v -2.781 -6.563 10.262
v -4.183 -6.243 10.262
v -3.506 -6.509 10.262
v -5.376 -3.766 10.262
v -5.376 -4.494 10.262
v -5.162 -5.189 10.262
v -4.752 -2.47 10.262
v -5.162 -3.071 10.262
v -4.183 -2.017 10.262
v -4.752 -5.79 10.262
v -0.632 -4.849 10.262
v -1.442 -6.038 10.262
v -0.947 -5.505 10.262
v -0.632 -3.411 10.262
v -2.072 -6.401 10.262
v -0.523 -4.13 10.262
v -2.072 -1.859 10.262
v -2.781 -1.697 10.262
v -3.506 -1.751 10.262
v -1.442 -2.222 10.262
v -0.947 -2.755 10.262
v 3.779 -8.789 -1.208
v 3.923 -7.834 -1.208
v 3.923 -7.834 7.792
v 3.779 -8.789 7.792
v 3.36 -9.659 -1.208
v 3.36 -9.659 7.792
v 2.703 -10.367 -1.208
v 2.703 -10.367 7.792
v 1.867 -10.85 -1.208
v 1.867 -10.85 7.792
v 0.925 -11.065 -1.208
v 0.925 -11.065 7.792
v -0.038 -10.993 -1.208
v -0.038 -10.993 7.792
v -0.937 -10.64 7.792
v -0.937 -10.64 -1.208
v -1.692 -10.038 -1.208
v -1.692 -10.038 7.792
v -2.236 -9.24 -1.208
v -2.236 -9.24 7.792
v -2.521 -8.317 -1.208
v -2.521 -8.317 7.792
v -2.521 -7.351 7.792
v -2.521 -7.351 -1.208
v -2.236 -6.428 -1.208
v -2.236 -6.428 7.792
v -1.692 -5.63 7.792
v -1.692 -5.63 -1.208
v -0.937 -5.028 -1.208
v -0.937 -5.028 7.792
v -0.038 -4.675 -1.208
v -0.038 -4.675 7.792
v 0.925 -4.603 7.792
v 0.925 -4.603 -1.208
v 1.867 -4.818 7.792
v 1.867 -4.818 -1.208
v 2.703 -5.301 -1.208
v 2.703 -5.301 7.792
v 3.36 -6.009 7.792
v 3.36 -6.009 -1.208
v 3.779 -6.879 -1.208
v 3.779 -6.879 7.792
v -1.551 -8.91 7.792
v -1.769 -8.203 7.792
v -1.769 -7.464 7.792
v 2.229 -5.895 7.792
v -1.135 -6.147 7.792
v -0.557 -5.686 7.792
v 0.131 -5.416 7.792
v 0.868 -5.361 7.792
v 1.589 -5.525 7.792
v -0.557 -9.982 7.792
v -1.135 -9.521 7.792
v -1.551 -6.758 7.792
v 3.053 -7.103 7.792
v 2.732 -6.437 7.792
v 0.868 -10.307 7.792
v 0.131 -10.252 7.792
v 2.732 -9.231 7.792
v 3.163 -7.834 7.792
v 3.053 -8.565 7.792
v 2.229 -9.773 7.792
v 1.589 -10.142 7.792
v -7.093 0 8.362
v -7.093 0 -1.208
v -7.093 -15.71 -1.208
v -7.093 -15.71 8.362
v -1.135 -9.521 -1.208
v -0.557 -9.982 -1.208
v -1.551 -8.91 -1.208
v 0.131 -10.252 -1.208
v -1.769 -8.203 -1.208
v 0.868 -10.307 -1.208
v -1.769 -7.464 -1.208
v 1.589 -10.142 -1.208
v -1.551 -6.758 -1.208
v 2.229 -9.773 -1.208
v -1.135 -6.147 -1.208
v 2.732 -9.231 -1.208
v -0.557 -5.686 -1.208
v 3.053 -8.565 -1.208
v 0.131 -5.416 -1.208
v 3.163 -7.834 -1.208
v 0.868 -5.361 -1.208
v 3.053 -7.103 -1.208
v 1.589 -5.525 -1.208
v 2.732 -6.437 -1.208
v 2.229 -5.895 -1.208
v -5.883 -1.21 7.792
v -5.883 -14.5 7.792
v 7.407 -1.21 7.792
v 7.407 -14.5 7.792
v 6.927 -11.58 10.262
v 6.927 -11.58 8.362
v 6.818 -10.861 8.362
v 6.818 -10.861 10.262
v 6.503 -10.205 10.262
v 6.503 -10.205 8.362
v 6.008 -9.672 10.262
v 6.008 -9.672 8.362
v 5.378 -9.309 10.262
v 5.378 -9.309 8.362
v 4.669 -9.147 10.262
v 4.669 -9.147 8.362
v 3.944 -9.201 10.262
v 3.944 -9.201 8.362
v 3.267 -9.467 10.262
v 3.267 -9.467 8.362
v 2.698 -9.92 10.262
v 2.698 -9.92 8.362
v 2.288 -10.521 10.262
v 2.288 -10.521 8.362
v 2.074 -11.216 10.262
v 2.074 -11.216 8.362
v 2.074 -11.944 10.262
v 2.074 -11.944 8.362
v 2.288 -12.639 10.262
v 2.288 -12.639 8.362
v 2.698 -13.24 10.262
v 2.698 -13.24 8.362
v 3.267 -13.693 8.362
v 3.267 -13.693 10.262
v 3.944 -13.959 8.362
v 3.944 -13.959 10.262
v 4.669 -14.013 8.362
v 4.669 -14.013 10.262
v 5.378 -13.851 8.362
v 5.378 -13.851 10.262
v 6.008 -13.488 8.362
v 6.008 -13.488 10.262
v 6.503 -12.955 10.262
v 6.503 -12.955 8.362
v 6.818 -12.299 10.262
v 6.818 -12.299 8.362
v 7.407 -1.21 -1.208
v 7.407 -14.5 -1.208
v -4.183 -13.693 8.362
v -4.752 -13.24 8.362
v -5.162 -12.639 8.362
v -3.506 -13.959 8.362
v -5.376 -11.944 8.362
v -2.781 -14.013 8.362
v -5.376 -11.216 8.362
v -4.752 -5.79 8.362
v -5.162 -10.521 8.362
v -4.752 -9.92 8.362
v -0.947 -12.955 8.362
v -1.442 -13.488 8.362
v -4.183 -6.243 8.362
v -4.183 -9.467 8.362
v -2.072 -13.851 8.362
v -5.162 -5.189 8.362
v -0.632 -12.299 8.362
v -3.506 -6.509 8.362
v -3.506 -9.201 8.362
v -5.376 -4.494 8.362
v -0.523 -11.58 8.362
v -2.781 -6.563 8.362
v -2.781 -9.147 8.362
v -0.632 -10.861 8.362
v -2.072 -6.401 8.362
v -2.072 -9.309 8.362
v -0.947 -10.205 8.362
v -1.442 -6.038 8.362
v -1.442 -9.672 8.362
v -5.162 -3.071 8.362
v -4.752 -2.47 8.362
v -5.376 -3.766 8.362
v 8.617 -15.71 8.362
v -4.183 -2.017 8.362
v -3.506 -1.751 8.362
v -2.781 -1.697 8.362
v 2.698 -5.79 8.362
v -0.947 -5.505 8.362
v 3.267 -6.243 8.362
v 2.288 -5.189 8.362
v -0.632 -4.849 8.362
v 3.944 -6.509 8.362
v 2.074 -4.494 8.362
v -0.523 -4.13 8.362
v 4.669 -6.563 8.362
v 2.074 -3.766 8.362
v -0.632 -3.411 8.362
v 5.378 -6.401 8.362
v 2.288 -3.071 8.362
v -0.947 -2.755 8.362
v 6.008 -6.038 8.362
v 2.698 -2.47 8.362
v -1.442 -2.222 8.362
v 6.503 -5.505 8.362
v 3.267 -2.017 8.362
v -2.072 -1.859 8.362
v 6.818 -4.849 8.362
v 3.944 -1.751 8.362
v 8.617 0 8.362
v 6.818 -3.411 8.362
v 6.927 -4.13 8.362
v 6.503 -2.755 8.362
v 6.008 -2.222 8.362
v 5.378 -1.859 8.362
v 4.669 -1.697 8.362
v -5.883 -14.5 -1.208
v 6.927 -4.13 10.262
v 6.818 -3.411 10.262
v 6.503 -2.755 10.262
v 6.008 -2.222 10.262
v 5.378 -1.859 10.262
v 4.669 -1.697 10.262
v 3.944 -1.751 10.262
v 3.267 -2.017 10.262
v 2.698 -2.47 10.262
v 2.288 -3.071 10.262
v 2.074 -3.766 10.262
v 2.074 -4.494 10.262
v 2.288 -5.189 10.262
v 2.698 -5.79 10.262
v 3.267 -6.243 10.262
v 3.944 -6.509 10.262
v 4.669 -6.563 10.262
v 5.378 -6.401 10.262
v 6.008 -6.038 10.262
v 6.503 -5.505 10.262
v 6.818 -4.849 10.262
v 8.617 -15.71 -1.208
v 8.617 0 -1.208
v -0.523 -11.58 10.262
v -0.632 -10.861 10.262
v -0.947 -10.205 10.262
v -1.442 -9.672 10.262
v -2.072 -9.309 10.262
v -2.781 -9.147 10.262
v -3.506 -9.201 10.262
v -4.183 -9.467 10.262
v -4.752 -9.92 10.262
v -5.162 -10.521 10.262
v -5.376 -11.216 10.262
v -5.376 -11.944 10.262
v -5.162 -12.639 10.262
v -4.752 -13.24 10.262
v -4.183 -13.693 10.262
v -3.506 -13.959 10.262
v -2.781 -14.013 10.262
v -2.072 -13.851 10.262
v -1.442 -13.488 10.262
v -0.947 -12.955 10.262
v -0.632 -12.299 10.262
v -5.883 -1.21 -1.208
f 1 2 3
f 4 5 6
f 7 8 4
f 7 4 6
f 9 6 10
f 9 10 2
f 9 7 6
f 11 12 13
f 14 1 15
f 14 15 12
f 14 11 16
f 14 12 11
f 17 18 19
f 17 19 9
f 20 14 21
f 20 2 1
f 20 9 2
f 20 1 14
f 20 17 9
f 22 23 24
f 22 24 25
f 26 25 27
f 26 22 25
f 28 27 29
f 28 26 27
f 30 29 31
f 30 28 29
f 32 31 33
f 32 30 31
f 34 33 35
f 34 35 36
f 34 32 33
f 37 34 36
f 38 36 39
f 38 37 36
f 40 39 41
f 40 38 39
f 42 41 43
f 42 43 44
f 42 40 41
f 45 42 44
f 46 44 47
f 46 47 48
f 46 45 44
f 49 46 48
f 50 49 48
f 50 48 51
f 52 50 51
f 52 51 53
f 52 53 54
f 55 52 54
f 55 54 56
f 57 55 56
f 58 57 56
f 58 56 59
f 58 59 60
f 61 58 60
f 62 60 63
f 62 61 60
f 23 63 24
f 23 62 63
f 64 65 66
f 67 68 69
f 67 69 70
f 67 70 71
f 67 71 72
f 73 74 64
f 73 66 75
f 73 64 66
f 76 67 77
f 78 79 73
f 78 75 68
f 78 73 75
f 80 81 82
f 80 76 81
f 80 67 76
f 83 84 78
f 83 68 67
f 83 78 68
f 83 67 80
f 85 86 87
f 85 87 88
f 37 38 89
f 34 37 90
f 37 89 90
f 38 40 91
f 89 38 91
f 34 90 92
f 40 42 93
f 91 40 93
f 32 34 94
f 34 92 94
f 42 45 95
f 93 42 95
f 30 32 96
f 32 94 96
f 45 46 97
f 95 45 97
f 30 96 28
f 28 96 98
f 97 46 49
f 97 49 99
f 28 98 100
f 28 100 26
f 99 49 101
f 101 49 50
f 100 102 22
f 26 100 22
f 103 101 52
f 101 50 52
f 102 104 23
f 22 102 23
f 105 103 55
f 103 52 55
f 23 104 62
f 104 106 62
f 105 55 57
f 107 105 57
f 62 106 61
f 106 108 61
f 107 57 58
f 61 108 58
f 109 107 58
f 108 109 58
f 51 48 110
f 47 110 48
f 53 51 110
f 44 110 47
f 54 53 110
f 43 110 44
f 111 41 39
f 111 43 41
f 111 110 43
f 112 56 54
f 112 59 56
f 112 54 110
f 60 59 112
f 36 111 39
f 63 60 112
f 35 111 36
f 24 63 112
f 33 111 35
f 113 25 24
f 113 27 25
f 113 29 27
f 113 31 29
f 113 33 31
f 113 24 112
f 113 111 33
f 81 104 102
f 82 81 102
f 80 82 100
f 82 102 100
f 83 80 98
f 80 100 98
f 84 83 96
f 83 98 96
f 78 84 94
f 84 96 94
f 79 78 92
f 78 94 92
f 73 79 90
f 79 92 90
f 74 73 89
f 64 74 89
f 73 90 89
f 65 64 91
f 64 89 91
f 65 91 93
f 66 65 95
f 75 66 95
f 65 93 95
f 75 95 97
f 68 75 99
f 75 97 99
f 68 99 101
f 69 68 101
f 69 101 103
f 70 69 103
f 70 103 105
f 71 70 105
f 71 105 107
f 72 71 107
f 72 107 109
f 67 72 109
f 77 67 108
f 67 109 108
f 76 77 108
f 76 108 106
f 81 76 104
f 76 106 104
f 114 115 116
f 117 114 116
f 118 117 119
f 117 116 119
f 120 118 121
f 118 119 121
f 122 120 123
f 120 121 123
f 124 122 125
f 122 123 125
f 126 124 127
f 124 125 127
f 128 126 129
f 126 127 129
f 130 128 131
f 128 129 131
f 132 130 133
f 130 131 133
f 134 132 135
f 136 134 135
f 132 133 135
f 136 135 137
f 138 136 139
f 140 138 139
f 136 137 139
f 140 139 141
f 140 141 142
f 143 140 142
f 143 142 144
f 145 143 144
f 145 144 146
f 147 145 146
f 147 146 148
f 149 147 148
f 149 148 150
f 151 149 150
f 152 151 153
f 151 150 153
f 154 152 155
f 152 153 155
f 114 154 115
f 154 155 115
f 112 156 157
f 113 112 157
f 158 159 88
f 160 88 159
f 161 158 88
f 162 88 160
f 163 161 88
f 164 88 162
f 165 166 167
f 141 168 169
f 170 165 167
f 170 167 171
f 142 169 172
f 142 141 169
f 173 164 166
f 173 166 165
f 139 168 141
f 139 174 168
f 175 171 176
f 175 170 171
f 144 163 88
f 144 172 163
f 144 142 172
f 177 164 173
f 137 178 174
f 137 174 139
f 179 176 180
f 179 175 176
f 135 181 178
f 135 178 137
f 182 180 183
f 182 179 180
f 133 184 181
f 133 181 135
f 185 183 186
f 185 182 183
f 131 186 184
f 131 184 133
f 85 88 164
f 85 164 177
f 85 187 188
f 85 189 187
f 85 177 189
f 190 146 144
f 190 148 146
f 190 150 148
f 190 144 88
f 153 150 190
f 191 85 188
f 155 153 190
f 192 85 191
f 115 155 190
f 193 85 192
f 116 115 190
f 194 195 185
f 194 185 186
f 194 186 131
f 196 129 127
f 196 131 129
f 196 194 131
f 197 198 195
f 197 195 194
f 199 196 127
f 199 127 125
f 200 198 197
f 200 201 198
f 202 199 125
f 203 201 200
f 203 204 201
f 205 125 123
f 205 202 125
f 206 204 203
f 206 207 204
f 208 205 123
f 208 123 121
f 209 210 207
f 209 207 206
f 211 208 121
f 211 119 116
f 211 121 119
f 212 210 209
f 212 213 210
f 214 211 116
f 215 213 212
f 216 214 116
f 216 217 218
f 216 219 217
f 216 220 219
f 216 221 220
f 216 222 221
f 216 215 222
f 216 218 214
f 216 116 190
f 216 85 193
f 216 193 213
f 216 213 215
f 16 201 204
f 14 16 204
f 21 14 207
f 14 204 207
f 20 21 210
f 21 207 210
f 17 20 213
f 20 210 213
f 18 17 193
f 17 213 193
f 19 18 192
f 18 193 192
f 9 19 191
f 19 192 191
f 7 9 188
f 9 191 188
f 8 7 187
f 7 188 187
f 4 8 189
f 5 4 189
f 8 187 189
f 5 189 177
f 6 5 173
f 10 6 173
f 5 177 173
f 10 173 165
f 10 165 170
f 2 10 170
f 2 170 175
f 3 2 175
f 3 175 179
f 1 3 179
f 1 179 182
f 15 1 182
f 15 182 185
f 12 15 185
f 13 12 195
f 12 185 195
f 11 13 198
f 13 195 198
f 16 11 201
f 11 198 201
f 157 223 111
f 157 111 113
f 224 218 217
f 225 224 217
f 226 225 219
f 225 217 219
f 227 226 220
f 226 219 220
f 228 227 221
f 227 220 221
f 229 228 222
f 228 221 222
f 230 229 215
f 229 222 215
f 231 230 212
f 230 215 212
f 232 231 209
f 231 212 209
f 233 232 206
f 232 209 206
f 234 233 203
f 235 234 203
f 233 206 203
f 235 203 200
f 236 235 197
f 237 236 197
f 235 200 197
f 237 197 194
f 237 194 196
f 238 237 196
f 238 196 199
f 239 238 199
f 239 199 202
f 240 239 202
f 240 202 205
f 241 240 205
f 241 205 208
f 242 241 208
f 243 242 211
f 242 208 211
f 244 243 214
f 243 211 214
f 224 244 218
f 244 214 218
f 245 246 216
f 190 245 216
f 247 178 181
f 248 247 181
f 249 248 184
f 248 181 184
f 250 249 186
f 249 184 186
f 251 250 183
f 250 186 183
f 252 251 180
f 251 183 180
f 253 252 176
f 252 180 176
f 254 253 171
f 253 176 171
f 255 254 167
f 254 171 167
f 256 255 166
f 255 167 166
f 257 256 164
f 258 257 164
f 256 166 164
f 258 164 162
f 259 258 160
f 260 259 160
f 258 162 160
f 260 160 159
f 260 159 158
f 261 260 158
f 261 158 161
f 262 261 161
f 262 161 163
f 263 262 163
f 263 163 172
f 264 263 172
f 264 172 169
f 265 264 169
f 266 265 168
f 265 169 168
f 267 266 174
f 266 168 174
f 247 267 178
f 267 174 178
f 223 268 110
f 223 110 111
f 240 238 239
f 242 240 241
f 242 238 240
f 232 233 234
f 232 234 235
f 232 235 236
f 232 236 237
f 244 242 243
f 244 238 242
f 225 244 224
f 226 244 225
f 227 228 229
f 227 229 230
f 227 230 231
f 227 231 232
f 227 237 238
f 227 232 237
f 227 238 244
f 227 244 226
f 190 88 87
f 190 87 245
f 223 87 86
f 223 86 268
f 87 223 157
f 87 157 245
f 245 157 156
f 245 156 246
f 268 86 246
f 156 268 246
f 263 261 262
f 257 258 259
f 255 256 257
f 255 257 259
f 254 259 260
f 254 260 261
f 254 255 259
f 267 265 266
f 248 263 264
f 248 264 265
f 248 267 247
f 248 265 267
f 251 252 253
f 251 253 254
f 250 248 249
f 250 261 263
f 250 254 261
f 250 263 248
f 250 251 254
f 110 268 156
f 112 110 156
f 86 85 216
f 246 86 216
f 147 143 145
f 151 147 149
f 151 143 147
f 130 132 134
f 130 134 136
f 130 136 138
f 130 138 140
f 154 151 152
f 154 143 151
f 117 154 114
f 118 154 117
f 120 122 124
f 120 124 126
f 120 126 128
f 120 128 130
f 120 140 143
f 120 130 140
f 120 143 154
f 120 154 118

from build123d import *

# Parameters (mm, degrees)
F0_W     = 15.71
F0_H     = 9.57
F1_DEPTH = 15.71
F2_R     = 2.44
F3_DEPTH = 1.9
F4_W     = 13.29
F4_H     = 13.29
F4_R     = 2
F4_R_2   = 3.24
F5_DEPTH = 9
F6_R     = 2.48
F7_DEPTH = 9


with BuildPart() as f1:
    # F0 (on Front) → F1 (new body)
    with BuildSketch(Plane.XZ):
        with Locations((0.7616067305, 3.5766704181)):
            Rectangle(F0_W, F0_H)
    extrude(amount=F1_DEPTH)

    # F2 (on face) → F3 (join)
    with BuildSketch(Plane.XY.offset(8.3616704181)):
        with Locations((4.4866067305, -11.58)):
            Circle(F2_R)
        with Locations((-2.9633932695, -11.58)):
            Circle(F2_R)
        with Locations((-2.9633932695, -4.13)):
            Circle(F2_R)
        with Locations((4.4866067305, -4.13)):
            Circle(F2_R)
    extrude(amount=F3_DEPTH)

    # F4 (on face) → F5 (cut)
    with BuildSketch(Plane(origin=(0, 0, -1.2083295819), x_dir=(1, 0, 0), z_dir=(0, 0, -1))):
        with Locations((0.7616067305, 7.855)):
            Rectangle(F4_W, F4_H)
        with Locations((-3.647951686, 3.4200778348)):
            Circle(F4_R, mode=Mode.SUBTRACT)
        with Locations((0.6830992061, 7.8338431194)):
            Circle(F4_R_2, mode=Mode.SUBTRACT)
        with Locations((5.201886408, 3.4736101516)):
            Circle(F4_R, mode=Mode.SUBTRACT)
        with Locations((-3.6477285673, 12.270077832)):
            Circle(F4_R, mode=Mode.SUBTRACT)
        with Locations((5.2021095268, 12.3236101487)):
            Circle(F4_R, mode=Mode.SUBTRACT)
        with Locations((-3.647951686, 3.4200778348)):
            Circle(F4_R)
        with Locations((-3.6477285673, 12.270077832)):
            Circle(F4_R)
        with Locations((5.2021095268, 12.3236101487)):
            Circle(F4_R)
        with Locations((5.201886408, 3.4736101516)):
            Circle(F4_R)
    extrude(amount=-F5_DEPTH, mode=Mode.SUBTRACT)

    # F6 (on face) → F7 (cut)
    with BuildSketch(Plane(origin=(0, 0, -1.2083295819), x_dir=(1, 0, 0), z_dir=(0, 0, -1))):
        with Locations((0.6830992061, 7.8338431194)):
            Circle(F6_R)
    extrude(amount=-F7_DEPTH, mode=Mode.SUBTRACT)


solid = f1.part
